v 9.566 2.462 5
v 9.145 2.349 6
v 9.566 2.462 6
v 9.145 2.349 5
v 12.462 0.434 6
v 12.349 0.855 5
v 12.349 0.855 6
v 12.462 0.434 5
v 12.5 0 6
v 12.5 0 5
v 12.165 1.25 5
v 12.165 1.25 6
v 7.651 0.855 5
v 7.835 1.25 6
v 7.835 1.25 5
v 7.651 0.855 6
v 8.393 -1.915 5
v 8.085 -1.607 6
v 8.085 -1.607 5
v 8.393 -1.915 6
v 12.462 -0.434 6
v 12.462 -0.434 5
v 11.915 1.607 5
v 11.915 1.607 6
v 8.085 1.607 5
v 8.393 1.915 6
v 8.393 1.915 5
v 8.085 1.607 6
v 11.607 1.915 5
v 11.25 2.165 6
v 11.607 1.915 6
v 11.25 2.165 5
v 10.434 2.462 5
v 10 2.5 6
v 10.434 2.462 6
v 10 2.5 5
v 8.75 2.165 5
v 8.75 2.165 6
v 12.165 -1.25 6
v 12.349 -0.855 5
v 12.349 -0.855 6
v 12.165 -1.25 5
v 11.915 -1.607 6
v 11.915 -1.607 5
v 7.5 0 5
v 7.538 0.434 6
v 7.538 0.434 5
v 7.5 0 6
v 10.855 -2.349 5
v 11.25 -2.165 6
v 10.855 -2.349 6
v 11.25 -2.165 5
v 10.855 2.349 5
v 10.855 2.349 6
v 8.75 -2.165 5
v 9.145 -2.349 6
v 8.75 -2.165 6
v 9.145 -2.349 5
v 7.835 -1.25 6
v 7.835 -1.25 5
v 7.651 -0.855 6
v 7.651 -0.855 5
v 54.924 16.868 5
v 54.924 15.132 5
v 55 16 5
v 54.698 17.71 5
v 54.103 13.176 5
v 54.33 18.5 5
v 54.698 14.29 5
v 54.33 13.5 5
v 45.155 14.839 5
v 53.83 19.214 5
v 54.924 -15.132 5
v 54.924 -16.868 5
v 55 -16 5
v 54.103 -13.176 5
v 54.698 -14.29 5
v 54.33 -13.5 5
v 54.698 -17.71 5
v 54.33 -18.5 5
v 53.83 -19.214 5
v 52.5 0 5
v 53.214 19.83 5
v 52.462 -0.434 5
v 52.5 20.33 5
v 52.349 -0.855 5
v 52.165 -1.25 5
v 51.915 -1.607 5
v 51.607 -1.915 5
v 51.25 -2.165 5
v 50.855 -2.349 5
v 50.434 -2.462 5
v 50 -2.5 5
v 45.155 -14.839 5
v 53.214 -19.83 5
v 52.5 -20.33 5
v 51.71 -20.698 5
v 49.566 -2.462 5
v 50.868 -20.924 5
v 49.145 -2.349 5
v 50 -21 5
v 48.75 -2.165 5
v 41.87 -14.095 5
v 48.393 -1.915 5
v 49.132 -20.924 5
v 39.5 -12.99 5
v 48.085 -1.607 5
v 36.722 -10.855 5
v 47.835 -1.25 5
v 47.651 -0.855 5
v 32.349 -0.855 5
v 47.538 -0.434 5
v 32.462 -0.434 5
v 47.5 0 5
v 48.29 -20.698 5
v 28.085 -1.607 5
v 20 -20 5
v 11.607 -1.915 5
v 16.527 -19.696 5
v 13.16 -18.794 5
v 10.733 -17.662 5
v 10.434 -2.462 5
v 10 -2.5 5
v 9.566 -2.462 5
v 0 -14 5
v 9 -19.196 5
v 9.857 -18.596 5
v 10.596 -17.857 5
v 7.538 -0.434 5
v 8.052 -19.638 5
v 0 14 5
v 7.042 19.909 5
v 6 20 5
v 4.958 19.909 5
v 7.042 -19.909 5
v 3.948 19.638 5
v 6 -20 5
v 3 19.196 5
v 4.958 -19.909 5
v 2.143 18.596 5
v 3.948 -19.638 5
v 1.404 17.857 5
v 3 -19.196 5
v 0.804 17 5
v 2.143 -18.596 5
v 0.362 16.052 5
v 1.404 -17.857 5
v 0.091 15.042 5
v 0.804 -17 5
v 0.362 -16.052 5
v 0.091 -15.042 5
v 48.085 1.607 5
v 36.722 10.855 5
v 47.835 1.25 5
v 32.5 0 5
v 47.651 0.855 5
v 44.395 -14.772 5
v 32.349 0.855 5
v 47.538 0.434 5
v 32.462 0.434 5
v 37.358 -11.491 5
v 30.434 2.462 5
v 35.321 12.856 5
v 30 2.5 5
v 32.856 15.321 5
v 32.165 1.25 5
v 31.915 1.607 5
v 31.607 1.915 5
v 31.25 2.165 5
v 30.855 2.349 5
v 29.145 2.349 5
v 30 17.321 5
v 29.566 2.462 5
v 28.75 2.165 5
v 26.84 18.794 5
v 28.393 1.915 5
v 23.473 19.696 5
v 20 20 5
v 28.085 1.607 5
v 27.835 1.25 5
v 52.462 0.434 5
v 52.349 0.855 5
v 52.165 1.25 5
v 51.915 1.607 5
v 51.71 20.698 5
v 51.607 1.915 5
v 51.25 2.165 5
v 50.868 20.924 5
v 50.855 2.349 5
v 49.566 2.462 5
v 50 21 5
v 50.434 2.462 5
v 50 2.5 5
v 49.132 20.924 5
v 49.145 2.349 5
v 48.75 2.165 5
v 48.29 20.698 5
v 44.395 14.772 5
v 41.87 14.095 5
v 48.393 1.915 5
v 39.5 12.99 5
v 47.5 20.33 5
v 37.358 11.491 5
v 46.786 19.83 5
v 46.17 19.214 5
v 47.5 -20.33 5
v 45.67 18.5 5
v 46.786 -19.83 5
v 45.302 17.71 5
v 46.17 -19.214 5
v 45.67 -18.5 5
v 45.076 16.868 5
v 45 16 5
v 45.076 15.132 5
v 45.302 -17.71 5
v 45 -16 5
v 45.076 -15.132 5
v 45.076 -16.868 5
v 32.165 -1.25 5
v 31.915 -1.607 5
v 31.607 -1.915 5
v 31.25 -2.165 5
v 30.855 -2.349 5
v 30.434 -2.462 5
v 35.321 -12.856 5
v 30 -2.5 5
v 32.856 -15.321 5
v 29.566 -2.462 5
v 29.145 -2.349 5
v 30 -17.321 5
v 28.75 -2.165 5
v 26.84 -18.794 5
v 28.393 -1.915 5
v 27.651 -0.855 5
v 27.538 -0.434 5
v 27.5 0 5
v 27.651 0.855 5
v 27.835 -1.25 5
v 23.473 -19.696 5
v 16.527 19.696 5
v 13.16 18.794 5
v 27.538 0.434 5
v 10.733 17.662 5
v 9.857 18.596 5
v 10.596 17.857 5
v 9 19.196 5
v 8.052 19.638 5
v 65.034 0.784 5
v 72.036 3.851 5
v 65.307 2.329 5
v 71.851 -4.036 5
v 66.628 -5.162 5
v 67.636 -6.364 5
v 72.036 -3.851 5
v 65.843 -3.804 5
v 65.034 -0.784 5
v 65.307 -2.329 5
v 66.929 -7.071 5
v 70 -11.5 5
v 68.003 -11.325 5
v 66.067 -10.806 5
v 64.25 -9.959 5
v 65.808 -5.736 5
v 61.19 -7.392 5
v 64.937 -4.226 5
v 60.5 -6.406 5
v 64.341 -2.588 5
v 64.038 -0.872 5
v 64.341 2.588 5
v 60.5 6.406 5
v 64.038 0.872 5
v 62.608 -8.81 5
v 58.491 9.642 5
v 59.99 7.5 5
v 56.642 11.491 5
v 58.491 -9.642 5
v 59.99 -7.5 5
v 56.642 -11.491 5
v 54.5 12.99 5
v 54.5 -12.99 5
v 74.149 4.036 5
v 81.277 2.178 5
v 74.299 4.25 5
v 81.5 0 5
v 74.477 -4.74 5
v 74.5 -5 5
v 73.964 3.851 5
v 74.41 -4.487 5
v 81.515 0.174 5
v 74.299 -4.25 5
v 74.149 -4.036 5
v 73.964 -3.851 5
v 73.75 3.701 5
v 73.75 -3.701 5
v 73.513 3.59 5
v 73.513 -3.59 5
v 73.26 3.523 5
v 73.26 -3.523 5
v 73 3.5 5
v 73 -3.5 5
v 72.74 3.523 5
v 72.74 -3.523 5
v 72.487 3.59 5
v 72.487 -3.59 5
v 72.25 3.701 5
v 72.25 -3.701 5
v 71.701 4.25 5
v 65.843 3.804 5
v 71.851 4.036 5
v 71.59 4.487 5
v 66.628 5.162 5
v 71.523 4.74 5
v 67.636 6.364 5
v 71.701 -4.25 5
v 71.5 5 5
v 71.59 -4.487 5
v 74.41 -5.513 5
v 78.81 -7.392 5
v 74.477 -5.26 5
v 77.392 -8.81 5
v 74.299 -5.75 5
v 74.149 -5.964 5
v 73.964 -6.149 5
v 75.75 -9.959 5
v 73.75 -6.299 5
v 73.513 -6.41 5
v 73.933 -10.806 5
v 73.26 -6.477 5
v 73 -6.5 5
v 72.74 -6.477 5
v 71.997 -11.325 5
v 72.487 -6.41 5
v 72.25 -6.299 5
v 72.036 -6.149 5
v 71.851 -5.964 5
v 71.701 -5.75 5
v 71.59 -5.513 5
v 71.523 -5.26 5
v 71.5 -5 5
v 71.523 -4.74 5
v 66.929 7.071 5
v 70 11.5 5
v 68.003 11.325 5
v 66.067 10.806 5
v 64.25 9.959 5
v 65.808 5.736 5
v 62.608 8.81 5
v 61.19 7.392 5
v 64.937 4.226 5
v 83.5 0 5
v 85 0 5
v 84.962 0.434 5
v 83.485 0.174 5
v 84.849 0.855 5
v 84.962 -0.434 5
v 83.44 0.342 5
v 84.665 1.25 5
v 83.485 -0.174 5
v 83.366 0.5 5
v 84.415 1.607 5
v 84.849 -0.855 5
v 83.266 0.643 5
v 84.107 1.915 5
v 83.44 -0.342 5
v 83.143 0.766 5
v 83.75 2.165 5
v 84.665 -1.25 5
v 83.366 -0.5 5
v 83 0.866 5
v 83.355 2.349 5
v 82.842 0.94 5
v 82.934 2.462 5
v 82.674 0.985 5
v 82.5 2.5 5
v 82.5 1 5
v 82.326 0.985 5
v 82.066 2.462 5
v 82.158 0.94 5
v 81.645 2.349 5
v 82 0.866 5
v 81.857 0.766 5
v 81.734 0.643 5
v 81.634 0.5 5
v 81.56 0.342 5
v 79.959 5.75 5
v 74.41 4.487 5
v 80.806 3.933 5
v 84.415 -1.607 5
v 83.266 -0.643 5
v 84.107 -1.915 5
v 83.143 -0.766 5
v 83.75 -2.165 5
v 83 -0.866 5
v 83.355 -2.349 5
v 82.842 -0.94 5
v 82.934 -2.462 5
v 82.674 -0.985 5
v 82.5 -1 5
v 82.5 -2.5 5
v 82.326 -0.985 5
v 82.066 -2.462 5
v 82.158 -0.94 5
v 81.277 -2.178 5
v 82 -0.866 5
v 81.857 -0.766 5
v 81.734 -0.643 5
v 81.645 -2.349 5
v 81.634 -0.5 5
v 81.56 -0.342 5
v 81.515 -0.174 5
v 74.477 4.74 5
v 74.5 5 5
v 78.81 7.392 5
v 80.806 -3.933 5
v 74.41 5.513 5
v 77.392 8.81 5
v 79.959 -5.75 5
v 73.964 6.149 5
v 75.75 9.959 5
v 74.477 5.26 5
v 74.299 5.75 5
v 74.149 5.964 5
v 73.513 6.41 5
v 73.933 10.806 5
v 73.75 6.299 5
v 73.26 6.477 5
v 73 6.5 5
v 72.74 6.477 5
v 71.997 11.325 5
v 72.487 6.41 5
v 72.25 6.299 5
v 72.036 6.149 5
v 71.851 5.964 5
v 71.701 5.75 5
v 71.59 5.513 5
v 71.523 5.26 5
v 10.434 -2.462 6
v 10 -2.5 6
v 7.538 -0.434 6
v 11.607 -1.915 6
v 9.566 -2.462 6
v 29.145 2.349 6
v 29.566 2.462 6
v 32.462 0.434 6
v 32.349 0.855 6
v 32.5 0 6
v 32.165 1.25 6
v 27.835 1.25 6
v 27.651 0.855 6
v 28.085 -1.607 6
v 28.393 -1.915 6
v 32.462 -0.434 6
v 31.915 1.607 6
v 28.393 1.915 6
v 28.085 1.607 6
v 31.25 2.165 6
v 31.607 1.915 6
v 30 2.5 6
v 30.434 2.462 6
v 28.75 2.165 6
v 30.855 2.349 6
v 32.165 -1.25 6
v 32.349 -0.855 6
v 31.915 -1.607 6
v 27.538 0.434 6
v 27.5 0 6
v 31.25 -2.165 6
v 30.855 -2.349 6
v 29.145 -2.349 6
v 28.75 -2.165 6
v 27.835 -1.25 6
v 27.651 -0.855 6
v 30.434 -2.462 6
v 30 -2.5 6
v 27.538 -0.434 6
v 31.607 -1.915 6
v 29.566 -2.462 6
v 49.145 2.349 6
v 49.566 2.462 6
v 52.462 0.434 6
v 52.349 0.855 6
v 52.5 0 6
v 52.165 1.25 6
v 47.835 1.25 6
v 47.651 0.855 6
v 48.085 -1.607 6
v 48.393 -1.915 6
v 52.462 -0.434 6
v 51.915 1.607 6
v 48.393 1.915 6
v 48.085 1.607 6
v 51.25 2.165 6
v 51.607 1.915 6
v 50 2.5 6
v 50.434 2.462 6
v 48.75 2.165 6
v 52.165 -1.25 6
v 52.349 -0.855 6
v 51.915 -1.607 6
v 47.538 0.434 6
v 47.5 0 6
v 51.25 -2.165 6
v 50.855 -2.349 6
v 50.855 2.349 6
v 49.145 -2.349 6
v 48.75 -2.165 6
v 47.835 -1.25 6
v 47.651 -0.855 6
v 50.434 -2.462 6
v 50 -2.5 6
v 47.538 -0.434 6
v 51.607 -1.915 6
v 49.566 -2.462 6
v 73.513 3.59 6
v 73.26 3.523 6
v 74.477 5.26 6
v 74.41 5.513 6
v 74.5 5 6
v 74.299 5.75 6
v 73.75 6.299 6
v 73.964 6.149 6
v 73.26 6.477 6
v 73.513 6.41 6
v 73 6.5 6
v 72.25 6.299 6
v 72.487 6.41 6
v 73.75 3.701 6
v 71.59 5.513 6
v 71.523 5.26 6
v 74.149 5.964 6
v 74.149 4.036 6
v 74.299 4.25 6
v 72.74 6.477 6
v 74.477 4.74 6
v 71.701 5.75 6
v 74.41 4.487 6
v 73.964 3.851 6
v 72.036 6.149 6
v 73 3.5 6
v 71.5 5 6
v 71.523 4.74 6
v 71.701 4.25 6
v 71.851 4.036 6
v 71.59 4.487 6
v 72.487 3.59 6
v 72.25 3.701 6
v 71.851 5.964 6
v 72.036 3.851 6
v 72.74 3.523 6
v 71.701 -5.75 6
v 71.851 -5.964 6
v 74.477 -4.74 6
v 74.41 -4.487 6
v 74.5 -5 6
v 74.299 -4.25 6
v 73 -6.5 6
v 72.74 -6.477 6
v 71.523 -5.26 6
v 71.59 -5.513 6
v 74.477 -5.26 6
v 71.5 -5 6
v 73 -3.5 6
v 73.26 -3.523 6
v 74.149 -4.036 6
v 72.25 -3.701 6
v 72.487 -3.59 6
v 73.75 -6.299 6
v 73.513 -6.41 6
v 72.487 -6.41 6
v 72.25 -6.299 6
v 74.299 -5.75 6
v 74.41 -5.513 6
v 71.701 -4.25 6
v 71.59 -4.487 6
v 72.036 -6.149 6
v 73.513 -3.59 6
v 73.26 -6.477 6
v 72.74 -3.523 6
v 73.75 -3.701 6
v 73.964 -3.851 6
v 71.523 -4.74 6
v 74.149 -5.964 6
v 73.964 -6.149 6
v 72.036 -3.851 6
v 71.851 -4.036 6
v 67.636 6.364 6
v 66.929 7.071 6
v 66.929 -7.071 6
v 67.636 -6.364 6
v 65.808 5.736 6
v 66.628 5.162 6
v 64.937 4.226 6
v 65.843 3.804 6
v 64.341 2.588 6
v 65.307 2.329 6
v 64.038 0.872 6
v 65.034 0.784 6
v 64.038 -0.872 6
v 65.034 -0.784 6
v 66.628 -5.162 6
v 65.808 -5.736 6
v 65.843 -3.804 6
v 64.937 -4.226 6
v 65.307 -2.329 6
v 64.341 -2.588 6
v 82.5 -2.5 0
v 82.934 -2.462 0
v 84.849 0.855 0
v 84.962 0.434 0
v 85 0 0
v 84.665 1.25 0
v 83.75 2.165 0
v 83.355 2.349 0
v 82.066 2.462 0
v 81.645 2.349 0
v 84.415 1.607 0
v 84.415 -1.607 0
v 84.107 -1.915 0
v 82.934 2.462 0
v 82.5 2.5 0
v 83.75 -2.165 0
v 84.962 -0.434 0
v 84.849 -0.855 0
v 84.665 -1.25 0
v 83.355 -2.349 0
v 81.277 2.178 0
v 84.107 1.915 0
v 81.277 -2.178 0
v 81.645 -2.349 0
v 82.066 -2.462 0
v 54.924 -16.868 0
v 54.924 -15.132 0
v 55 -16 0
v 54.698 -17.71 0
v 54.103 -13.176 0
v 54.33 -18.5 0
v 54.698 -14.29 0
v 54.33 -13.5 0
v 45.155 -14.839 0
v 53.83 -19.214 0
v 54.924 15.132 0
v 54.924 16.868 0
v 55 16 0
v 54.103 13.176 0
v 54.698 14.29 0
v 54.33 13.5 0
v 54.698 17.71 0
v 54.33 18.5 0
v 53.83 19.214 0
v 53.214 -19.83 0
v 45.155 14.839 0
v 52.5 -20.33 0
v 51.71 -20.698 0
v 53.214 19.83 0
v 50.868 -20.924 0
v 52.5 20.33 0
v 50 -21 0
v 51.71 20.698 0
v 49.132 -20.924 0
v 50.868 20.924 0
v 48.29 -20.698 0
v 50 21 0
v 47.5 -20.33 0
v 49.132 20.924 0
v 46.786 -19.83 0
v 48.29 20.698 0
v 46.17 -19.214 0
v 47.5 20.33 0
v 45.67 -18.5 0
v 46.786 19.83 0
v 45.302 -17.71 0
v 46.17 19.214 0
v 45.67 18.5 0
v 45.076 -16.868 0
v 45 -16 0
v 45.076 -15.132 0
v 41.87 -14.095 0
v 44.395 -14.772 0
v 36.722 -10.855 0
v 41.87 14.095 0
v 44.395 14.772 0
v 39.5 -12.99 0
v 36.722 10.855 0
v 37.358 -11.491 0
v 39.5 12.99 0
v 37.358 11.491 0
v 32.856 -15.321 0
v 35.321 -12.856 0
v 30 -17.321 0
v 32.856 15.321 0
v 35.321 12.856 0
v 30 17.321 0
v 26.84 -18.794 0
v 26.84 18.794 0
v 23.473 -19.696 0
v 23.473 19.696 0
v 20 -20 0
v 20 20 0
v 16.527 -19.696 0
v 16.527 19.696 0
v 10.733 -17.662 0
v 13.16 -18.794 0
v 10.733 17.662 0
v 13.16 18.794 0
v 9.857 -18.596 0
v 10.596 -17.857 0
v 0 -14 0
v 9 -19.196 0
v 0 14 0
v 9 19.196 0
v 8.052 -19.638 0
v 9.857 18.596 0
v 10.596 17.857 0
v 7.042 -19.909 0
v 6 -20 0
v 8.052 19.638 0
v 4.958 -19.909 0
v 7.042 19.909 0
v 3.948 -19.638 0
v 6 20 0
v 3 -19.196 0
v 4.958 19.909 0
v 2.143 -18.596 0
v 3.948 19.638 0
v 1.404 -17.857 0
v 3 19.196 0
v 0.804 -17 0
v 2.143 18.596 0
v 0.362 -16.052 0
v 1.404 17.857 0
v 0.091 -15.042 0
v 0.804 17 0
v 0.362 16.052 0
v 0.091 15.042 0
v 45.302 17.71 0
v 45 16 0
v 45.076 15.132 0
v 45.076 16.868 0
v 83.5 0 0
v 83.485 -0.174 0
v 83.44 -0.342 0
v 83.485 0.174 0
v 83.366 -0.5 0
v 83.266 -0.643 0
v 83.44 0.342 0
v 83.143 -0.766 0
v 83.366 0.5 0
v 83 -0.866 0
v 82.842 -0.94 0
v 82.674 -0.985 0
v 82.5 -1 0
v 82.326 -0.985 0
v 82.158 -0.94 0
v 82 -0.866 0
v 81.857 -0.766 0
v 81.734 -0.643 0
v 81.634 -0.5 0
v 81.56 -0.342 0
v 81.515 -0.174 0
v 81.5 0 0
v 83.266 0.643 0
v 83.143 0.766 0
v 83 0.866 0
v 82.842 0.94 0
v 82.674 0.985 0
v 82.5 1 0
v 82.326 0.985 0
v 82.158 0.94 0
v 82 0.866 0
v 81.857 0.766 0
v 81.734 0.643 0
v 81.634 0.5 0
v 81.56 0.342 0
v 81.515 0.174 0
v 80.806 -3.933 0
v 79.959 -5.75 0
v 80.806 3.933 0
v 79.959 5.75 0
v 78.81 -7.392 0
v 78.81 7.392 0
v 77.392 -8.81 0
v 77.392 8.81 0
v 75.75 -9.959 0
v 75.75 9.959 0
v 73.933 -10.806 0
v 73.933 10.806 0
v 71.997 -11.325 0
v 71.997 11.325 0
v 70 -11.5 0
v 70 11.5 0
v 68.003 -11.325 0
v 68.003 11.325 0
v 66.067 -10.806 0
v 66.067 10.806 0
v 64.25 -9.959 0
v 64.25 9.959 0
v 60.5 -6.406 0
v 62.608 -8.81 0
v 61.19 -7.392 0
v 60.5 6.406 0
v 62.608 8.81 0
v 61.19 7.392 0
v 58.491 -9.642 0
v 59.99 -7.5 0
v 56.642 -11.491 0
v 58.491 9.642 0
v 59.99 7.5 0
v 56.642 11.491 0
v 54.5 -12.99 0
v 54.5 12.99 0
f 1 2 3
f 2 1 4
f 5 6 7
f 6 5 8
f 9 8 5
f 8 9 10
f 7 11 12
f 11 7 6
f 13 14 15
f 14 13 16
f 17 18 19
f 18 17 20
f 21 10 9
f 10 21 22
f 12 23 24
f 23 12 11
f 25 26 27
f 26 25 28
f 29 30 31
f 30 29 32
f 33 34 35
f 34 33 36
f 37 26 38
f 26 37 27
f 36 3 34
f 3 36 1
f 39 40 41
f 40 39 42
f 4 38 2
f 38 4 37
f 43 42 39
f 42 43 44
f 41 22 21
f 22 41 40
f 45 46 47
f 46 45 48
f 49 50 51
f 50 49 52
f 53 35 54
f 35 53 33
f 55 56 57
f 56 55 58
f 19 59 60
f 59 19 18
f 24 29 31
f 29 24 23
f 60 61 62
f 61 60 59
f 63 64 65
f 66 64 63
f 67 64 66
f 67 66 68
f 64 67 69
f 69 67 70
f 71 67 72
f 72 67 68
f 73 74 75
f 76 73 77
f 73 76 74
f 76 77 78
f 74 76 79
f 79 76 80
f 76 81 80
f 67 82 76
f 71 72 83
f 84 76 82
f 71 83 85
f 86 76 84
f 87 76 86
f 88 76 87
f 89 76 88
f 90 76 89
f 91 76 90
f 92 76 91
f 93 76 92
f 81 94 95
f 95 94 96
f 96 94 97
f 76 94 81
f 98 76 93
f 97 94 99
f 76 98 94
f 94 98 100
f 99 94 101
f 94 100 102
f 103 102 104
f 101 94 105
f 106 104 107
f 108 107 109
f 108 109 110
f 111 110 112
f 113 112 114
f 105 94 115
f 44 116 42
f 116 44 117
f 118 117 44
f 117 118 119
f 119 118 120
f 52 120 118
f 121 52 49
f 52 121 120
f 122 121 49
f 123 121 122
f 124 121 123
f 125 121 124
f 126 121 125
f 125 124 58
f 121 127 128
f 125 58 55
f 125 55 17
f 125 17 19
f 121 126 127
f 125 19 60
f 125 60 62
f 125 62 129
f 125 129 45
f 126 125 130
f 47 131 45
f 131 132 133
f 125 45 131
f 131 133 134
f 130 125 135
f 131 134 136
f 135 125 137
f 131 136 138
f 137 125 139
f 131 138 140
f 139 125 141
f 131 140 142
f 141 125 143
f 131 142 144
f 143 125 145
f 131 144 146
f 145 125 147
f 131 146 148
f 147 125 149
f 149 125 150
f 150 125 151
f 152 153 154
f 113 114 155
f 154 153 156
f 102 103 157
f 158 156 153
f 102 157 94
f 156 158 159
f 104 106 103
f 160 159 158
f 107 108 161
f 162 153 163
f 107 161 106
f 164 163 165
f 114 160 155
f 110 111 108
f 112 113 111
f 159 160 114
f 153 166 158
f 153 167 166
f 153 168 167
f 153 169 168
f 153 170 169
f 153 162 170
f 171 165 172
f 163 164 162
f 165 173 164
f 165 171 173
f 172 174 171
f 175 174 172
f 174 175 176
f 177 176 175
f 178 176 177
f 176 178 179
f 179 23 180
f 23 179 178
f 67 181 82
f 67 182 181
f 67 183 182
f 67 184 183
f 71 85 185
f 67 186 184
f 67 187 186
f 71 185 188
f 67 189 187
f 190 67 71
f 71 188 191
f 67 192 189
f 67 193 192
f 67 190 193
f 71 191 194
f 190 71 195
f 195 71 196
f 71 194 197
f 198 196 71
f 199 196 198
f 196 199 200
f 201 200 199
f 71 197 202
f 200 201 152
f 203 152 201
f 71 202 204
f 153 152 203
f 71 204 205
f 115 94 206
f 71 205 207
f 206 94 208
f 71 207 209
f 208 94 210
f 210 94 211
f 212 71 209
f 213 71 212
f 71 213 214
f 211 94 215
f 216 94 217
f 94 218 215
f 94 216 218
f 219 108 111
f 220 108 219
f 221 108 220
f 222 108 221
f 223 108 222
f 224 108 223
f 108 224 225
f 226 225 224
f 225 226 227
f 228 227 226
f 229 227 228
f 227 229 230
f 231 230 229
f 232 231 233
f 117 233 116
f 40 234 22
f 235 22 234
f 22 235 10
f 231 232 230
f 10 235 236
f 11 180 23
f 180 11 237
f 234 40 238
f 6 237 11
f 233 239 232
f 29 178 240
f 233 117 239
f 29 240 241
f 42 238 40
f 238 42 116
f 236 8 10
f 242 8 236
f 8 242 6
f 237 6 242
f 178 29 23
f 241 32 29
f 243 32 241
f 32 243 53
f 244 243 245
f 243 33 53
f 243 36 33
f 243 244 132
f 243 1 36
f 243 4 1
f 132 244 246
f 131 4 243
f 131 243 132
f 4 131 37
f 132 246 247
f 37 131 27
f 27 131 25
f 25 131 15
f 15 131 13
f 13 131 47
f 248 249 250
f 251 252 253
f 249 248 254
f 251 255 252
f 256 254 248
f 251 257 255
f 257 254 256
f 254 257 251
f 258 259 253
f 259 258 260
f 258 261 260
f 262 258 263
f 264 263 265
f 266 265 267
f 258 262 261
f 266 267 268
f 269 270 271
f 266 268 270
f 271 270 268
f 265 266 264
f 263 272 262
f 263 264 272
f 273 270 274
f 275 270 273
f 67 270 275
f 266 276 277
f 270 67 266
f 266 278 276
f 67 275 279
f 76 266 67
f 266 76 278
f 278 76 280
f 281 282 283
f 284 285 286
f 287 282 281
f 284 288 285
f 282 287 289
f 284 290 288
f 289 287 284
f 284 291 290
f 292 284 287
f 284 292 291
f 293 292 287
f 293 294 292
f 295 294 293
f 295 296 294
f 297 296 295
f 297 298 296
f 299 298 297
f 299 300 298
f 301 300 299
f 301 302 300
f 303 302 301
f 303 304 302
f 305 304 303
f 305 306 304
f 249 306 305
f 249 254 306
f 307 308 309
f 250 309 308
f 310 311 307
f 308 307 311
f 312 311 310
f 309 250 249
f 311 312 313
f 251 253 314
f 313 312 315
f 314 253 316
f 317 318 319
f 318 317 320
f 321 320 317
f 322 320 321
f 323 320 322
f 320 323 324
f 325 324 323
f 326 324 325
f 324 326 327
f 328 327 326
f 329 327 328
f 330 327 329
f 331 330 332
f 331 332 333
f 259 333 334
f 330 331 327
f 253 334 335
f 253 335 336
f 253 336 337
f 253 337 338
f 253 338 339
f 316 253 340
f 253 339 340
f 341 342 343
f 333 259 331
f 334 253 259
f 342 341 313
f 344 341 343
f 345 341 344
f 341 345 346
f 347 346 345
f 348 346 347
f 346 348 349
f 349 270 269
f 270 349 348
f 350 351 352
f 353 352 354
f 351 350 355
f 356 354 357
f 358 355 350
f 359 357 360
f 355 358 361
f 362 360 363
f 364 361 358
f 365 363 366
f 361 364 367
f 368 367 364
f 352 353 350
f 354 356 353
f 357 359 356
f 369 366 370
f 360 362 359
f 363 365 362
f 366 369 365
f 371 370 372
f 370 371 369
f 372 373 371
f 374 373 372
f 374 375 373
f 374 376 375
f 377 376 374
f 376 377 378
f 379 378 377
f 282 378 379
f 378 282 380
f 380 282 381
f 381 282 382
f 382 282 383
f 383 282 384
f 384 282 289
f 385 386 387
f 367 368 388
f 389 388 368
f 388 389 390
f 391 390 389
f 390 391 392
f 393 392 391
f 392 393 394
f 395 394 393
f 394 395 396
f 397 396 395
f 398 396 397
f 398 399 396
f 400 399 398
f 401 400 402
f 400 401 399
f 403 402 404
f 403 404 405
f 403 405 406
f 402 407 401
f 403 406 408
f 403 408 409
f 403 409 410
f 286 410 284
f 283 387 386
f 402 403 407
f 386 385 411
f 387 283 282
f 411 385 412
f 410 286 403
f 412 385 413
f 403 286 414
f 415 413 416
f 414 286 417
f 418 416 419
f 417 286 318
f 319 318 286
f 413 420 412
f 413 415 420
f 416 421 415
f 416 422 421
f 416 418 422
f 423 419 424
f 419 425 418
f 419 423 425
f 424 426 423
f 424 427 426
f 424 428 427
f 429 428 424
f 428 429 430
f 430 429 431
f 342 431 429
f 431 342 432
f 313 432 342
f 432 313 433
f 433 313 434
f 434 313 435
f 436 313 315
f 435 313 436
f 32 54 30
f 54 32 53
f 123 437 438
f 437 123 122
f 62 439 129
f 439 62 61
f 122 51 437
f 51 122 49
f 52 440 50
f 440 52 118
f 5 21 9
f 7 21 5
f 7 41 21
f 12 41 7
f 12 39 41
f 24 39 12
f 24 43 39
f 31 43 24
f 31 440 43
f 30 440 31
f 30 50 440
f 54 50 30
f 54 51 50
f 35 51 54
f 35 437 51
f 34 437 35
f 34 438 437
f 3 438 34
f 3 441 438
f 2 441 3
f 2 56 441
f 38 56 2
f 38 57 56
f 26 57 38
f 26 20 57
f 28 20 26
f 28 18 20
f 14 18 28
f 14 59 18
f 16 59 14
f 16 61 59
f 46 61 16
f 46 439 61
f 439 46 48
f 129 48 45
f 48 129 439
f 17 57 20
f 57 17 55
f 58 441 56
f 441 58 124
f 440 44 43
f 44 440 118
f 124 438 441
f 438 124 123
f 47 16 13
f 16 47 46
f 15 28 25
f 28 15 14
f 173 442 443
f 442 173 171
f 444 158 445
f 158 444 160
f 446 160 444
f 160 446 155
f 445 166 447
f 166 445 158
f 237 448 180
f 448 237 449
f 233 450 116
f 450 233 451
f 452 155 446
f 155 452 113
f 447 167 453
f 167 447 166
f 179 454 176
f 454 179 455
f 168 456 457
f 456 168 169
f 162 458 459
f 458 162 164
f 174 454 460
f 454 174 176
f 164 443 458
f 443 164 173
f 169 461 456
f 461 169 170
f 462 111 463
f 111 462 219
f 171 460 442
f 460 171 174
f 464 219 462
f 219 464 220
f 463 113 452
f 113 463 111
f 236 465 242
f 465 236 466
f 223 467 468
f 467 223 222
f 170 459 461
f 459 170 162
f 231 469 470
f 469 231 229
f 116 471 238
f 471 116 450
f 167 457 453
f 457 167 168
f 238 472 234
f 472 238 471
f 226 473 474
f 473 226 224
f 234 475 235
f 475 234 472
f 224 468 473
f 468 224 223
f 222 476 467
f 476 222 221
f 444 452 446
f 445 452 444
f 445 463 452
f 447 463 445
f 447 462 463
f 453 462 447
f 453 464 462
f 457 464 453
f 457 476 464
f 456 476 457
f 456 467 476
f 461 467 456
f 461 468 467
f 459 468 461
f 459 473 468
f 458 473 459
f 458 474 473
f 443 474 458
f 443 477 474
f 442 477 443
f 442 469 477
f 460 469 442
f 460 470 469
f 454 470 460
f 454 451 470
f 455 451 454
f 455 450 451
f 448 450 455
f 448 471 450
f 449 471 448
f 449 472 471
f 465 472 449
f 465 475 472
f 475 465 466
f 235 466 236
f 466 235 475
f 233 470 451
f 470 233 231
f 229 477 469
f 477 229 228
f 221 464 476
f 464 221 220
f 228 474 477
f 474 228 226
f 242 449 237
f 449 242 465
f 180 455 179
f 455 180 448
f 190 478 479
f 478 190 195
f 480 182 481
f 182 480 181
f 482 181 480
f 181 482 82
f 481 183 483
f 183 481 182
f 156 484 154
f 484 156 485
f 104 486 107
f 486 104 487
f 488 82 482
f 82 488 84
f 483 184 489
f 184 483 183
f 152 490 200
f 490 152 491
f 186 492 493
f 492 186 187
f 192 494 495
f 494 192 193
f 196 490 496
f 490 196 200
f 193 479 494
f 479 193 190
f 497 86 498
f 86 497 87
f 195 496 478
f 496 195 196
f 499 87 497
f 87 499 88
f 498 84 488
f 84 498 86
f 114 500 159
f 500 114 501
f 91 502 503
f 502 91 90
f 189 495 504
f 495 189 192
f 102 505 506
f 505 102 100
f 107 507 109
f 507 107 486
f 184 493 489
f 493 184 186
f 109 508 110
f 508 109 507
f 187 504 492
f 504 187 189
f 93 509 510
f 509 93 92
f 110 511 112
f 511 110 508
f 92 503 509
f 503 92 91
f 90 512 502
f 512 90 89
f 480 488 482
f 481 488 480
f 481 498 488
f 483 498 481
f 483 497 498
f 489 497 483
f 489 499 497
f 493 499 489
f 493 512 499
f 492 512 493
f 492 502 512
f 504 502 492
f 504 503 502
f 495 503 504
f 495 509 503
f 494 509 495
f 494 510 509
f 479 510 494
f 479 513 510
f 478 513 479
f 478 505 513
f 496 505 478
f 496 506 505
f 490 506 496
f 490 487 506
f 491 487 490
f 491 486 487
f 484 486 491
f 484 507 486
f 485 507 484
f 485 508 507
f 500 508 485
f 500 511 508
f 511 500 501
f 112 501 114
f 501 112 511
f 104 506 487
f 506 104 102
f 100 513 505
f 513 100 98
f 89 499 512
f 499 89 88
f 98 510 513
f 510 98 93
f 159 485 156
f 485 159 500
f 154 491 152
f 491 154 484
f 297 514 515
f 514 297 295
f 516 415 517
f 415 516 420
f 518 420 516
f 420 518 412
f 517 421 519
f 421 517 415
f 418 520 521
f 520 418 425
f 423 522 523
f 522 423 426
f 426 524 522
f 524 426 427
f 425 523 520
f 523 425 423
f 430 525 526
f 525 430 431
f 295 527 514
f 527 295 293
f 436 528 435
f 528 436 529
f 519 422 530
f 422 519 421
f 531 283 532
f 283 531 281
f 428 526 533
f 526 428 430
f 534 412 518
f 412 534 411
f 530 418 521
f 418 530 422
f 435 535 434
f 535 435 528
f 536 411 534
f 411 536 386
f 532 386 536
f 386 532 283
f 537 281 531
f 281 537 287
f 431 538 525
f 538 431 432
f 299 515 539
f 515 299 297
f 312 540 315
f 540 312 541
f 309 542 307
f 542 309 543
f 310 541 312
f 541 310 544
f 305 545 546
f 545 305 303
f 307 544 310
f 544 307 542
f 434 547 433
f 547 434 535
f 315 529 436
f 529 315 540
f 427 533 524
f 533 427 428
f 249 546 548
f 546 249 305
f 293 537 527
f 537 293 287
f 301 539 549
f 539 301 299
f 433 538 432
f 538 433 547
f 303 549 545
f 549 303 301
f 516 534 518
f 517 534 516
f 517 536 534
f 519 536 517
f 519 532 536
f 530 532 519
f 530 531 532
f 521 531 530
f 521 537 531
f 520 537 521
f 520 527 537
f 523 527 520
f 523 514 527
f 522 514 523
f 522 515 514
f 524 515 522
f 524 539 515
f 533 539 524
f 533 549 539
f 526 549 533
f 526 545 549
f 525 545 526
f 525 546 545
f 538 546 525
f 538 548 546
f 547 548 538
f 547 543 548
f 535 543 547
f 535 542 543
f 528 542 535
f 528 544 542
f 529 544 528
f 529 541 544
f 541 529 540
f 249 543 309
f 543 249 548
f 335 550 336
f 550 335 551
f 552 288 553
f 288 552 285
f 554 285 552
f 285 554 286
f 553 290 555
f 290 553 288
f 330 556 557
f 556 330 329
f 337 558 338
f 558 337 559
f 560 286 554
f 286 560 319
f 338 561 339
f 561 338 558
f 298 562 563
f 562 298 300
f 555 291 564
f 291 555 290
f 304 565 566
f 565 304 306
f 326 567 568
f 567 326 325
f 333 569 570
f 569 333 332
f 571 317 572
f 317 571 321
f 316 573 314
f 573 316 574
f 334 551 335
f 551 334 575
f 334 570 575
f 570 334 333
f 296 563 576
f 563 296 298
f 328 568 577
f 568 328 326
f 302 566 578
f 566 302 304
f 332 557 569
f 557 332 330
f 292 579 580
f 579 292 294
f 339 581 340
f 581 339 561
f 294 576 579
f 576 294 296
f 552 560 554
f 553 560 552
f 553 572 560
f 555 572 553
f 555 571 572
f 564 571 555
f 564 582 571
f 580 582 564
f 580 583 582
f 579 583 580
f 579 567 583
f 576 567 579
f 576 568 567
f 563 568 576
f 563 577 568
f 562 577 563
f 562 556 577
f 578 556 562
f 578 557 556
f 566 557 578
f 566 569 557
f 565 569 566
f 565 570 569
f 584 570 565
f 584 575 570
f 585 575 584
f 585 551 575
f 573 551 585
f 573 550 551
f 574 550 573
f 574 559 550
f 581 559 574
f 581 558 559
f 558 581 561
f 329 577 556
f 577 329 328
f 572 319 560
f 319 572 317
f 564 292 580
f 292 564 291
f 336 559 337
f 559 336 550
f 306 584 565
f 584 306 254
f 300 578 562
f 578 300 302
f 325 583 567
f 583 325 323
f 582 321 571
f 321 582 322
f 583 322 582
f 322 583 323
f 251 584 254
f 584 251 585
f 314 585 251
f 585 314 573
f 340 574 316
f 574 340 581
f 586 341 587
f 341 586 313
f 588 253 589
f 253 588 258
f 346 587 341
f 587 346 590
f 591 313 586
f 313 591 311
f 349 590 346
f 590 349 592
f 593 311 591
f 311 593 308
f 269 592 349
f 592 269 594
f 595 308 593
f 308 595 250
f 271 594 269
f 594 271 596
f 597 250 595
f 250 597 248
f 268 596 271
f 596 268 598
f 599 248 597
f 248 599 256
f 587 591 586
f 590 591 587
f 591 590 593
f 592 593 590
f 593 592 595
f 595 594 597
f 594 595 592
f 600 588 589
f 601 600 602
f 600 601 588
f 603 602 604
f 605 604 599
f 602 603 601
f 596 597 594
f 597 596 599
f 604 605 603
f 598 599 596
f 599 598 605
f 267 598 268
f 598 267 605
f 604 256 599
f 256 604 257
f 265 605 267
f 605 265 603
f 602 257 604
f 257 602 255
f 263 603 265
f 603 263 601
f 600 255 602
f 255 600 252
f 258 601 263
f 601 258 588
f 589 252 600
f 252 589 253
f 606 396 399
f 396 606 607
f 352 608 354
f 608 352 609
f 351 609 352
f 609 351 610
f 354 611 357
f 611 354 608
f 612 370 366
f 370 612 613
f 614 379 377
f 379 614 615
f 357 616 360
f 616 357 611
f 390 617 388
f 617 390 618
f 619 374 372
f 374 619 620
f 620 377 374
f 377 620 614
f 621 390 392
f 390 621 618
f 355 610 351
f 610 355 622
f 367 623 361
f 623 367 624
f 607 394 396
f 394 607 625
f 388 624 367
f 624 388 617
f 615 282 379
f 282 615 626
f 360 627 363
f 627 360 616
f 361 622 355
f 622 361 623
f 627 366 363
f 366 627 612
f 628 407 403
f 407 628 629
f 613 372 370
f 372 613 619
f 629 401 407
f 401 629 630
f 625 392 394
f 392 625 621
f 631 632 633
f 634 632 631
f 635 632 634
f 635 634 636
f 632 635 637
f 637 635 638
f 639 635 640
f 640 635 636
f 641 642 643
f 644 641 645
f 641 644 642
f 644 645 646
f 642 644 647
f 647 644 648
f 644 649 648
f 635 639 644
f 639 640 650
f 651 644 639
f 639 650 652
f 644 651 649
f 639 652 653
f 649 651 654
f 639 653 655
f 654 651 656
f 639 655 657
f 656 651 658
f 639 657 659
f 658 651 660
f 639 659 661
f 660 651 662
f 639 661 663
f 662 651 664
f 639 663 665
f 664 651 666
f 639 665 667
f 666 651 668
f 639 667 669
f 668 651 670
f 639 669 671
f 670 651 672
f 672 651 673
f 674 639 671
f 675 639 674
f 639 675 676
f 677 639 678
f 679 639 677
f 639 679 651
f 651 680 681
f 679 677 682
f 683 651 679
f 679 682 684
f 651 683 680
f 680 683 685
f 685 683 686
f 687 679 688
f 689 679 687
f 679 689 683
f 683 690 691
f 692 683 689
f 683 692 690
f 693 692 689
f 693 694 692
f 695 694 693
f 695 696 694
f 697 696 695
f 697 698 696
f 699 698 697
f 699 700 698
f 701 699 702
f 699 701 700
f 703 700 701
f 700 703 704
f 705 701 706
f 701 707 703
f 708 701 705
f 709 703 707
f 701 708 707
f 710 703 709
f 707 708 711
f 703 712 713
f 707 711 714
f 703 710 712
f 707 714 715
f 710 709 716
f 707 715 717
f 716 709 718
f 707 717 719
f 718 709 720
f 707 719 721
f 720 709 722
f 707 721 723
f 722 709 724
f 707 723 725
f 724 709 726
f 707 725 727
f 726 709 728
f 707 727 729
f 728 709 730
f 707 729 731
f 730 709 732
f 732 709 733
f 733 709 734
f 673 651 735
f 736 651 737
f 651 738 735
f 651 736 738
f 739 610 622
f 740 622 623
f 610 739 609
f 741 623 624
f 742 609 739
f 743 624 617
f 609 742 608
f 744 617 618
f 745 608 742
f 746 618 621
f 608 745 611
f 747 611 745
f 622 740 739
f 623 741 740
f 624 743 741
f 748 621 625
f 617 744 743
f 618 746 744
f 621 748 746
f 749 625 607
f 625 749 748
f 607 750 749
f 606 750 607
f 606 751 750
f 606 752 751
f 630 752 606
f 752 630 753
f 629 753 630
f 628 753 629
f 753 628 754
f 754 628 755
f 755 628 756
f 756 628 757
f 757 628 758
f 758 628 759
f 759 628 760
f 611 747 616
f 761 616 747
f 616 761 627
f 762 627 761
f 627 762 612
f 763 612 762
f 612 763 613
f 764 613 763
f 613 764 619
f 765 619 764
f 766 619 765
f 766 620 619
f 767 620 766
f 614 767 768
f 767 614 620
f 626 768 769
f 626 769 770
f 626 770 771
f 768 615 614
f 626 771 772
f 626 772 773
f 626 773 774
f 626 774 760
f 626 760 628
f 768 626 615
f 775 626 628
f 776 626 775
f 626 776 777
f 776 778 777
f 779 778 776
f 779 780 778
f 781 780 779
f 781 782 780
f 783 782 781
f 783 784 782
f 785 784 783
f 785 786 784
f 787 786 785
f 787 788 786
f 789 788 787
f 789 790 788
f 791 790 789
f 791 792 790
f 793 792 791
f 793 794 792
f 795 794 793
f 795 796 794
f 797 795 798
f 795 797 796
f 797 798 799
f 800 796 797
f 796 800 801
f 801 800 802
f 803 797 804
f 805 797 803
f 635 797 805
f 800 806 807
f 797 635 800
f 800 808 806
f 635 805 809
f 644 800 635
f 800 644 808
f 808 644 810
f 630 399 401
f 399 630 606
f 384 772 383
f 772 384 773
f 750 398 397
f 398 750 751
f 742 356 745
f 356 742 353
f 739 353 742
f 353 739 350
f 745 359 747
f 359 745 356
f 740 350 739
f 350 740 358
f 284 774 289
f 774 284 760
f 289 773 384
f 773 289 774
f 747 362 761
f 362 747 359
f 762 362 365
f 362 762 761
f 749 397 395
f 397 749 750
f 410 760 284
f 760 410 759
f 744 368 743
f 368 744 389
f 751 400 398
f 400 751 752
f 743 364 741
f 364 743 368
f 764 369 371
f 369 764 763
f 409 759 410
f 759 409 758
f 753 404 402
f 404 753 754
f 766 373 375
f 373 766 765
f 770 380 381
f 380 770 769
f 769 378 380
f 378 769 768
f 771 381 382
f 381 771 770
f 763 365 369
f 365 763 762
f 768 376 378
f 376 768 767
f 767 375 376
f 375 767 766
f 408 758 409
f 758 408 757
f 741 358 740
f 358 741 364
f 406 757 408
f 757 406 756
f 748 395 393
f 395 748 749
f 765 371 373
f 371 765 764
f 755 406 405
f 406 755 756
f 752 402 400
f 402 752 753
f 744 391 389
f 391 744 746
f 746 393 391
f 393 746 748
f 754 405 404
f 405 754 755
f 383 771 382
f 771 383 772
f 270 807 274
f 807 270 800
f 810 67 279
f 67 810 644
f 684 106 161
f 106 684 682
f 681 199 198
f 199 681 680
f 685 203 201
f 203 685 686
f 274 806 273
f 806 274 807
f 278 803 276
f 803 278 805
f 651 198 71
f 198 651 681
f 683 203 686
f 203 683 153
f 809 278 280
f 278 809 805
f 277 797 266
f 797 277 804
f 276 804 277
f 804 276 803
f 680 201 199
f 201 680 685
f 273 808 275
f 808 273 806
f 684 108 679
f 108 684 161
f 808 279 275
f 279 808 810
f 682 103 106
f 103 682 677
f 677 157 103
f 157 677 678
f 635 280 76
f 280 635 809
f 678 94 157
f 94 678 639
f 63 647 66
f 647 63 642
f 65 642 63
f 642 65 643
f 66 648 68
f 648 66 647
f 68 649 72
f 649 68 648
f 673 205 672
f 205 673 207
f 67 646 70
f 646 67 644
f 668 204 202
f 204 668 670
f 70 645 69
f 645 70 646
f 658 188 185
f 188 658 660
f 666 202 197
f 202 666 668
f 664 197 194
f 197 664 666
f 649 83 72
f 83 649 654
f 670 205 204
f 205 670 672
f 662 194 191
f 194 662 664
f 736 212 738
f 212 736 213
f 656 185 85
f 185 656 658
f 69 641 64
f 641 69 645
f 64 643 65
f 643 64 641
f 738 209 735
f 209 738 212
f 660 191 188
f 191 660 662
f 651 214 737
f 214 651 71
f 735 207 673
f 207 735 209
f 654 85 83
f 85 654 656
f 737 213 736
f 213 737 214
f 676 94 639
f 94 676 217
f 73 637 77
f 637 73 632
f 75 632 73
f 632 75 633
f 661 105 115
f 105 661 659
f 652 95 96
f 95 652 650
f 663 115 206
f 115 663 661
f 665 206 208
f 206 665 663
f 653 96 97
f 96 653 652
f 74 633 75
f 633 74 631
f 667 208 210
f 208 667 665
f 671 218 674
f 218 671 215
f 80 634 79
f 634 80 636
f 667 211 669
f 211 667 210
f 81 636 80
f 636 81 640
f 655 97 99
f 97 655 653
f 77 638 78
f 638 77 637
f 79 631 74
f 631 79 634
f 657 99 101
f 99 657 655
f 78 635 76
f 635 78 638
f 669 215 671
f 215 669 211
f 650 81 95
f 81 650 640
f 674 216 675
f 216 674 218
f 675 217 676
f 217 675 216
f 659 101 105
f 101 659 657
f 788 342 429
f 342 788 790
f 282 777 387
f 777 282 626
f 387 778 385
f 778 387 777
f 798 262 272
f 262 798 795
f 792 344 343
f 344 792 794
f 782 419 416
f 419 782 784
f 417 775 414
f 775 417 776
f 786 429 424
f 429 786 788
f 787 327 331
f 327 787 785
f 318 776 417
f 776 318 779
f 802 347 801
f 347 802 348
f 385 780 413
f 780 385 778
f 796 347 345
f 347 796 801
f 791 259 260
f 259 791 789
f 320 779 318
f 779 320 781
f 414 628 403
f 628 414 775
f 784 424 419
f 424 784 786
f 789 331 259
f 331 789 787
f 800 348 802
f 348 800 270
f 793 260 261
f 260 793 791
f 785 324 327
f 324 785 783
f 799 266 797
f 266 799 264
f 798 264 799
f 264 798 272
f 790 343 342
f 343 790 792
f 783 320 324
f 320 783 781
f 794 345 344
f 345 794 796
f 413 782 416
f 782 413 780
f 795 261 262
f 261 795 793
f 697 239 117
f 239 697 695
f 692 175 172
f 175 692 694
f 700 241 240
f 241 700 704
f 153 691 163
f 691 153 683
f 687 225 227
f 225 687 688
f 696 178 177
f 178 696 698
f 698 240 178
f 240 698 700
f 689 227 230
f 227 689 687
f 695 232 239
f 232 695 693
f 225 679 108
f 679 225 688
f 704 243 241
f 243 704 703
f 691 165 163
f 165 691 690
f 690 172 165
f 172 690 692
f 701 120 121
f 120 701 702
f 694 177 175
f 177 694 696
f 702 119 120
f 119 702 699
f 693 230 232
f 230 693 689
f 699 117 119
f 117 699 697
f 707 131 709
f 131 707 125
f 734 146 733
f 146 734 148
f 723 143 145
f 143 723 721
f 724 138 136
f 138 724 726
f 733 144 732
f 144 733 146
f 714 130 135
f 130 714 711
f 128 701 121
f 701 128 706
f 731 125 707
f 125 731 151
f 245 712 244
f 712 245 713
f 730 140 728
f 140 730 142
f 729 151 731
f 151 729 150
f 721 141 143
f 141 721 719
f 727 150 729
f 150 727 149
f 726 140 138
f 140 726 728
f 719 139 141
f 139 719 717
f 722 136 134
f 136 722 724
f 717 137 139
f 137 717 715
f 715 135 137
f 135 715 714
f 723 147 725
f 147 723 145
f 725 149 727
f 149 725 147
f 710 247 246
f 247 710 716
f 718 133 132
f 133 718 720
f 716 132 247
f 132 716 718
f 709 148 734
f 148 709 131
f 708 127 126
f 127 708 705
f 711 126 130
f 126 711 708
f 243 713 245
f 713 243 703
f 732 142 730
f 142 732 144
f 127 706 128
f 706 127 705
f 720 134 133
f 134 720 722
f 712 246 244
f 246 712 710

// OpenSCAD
body_color = "White"; // [Black, Blue, Brown, Chartreuse, Green, Magenta, Orange, Purple, Red, Teal, Violet, White, Yellow]
drawing_color = "Black"; // [Black, Blue, Brown, Chartreuse, Green, Magenta, Orange, Purple, Red, Teal, Violet, White, Yellow]

show_lug = true;

/* [Drawing] */
show_drawing = true;
buttons_diameter = 5;
eyes_diameter = 3;
lips_thickness = 1;

/* [Rounding] */
chamfer = false;
rounding = 1.2;

/* [Hidden] */
delta = 0.01;
$fn=36;

if (show_drawing)
{
    color(drawing_color)
    translate([0, 0, 5])
    {
        // buttons
        translate([10, 0, 0])
            cylinder(h=1, d = buttons_diameter);
        translate([30, 0, 0])
            cylinder(h=1, d = buttons_diameter);    
        translate([50, 0, 0])
            cylinder(h=1, d = buttons_diameter);

        // eyes
        translate([73, 5, 0])
            cylinder(h=1, d = eyes_diameter);
        translate([73, -5, 0])
            cylinder(h=1, d = eyes_diameter);

        // lips
        lips();

        // intersection_for example (uncomment to preview)
        //intersection_for_example();

        // nose
        /*translate([70, 0, 0])
        {
            cylinder(h = 1, d = 5);
        }*/
    };
}

color(body_color)
{
    // lug
    if (show_lug)
    translate([82.5, 0, 0])
    {
        difference()
        {
            cylinder(h = 5, d = 5);
            translate([0, 0, -delta])
                cylinder(h = 5 + 2 * delta, d = 2);
        }
    }

    hull()
    {
        translate([6, 14, 0])
            my_cylinder(h = 5, d = 12);
        translate([6, -14, 0])
            my_cylinder(h = 5, d = 12);
    }
            
    translate([20, 0, 0])
    {
        // bottom
        my_cylinder(h = 5, d = 40);

        translate([27, 0, 0])
        {
            // medium
            my_cylinder(h = 5, d = 30);
            
            // "hands"
            translate([3, 16, 0])
                my_cylinder(h = 5, d = 10);
            translate([3, -16, 0])
                my_cylinder(h = 5, d = 10);
            
            // "head"
            translate([23, 0, 0])
                my_cylinder(h = 5, d = 23);
        }
    }
}

module lips()
{
    translate([74, 0, 0])
    {
        rotate([0, 0, 135])
        rotate_extrude(angle = 90)
            translate([10 - lips_thickness, 0])
                square([lips_thickness, 1], center = false);
    }
}

module xor()
{
    assert($children == 2, "xor() requires exactly 2 children");

    difference()
    {
        union()
        {
            children(0);
            children(1);
        }
        intersection()
        {
            children(0);
            children(1);
        }
    }
}

module chain_hull_children()
{
    if ($children > 1)
    {
        for (i = [0 : $children - 2])
        {
            hull()
            {
                children(i);
                children(i + 1);
            }
        }
    }
}

module my_cylinder(h, d)
{
    if (chamfer)
    {
        cylinder(h=rounding, d1 = d - 2 * rounding, d2 = d);
        translate([0, 0, rounding])
            cylinder(h = h - 2 * rounding, d = d);
        translate([0, 0, h - rounding])
            cylinder(h=rounding, d1 = d, d2 = d - 2 * rounding);
    }
    else
    {
        cylinder(h=h, d = d);
    }
}
